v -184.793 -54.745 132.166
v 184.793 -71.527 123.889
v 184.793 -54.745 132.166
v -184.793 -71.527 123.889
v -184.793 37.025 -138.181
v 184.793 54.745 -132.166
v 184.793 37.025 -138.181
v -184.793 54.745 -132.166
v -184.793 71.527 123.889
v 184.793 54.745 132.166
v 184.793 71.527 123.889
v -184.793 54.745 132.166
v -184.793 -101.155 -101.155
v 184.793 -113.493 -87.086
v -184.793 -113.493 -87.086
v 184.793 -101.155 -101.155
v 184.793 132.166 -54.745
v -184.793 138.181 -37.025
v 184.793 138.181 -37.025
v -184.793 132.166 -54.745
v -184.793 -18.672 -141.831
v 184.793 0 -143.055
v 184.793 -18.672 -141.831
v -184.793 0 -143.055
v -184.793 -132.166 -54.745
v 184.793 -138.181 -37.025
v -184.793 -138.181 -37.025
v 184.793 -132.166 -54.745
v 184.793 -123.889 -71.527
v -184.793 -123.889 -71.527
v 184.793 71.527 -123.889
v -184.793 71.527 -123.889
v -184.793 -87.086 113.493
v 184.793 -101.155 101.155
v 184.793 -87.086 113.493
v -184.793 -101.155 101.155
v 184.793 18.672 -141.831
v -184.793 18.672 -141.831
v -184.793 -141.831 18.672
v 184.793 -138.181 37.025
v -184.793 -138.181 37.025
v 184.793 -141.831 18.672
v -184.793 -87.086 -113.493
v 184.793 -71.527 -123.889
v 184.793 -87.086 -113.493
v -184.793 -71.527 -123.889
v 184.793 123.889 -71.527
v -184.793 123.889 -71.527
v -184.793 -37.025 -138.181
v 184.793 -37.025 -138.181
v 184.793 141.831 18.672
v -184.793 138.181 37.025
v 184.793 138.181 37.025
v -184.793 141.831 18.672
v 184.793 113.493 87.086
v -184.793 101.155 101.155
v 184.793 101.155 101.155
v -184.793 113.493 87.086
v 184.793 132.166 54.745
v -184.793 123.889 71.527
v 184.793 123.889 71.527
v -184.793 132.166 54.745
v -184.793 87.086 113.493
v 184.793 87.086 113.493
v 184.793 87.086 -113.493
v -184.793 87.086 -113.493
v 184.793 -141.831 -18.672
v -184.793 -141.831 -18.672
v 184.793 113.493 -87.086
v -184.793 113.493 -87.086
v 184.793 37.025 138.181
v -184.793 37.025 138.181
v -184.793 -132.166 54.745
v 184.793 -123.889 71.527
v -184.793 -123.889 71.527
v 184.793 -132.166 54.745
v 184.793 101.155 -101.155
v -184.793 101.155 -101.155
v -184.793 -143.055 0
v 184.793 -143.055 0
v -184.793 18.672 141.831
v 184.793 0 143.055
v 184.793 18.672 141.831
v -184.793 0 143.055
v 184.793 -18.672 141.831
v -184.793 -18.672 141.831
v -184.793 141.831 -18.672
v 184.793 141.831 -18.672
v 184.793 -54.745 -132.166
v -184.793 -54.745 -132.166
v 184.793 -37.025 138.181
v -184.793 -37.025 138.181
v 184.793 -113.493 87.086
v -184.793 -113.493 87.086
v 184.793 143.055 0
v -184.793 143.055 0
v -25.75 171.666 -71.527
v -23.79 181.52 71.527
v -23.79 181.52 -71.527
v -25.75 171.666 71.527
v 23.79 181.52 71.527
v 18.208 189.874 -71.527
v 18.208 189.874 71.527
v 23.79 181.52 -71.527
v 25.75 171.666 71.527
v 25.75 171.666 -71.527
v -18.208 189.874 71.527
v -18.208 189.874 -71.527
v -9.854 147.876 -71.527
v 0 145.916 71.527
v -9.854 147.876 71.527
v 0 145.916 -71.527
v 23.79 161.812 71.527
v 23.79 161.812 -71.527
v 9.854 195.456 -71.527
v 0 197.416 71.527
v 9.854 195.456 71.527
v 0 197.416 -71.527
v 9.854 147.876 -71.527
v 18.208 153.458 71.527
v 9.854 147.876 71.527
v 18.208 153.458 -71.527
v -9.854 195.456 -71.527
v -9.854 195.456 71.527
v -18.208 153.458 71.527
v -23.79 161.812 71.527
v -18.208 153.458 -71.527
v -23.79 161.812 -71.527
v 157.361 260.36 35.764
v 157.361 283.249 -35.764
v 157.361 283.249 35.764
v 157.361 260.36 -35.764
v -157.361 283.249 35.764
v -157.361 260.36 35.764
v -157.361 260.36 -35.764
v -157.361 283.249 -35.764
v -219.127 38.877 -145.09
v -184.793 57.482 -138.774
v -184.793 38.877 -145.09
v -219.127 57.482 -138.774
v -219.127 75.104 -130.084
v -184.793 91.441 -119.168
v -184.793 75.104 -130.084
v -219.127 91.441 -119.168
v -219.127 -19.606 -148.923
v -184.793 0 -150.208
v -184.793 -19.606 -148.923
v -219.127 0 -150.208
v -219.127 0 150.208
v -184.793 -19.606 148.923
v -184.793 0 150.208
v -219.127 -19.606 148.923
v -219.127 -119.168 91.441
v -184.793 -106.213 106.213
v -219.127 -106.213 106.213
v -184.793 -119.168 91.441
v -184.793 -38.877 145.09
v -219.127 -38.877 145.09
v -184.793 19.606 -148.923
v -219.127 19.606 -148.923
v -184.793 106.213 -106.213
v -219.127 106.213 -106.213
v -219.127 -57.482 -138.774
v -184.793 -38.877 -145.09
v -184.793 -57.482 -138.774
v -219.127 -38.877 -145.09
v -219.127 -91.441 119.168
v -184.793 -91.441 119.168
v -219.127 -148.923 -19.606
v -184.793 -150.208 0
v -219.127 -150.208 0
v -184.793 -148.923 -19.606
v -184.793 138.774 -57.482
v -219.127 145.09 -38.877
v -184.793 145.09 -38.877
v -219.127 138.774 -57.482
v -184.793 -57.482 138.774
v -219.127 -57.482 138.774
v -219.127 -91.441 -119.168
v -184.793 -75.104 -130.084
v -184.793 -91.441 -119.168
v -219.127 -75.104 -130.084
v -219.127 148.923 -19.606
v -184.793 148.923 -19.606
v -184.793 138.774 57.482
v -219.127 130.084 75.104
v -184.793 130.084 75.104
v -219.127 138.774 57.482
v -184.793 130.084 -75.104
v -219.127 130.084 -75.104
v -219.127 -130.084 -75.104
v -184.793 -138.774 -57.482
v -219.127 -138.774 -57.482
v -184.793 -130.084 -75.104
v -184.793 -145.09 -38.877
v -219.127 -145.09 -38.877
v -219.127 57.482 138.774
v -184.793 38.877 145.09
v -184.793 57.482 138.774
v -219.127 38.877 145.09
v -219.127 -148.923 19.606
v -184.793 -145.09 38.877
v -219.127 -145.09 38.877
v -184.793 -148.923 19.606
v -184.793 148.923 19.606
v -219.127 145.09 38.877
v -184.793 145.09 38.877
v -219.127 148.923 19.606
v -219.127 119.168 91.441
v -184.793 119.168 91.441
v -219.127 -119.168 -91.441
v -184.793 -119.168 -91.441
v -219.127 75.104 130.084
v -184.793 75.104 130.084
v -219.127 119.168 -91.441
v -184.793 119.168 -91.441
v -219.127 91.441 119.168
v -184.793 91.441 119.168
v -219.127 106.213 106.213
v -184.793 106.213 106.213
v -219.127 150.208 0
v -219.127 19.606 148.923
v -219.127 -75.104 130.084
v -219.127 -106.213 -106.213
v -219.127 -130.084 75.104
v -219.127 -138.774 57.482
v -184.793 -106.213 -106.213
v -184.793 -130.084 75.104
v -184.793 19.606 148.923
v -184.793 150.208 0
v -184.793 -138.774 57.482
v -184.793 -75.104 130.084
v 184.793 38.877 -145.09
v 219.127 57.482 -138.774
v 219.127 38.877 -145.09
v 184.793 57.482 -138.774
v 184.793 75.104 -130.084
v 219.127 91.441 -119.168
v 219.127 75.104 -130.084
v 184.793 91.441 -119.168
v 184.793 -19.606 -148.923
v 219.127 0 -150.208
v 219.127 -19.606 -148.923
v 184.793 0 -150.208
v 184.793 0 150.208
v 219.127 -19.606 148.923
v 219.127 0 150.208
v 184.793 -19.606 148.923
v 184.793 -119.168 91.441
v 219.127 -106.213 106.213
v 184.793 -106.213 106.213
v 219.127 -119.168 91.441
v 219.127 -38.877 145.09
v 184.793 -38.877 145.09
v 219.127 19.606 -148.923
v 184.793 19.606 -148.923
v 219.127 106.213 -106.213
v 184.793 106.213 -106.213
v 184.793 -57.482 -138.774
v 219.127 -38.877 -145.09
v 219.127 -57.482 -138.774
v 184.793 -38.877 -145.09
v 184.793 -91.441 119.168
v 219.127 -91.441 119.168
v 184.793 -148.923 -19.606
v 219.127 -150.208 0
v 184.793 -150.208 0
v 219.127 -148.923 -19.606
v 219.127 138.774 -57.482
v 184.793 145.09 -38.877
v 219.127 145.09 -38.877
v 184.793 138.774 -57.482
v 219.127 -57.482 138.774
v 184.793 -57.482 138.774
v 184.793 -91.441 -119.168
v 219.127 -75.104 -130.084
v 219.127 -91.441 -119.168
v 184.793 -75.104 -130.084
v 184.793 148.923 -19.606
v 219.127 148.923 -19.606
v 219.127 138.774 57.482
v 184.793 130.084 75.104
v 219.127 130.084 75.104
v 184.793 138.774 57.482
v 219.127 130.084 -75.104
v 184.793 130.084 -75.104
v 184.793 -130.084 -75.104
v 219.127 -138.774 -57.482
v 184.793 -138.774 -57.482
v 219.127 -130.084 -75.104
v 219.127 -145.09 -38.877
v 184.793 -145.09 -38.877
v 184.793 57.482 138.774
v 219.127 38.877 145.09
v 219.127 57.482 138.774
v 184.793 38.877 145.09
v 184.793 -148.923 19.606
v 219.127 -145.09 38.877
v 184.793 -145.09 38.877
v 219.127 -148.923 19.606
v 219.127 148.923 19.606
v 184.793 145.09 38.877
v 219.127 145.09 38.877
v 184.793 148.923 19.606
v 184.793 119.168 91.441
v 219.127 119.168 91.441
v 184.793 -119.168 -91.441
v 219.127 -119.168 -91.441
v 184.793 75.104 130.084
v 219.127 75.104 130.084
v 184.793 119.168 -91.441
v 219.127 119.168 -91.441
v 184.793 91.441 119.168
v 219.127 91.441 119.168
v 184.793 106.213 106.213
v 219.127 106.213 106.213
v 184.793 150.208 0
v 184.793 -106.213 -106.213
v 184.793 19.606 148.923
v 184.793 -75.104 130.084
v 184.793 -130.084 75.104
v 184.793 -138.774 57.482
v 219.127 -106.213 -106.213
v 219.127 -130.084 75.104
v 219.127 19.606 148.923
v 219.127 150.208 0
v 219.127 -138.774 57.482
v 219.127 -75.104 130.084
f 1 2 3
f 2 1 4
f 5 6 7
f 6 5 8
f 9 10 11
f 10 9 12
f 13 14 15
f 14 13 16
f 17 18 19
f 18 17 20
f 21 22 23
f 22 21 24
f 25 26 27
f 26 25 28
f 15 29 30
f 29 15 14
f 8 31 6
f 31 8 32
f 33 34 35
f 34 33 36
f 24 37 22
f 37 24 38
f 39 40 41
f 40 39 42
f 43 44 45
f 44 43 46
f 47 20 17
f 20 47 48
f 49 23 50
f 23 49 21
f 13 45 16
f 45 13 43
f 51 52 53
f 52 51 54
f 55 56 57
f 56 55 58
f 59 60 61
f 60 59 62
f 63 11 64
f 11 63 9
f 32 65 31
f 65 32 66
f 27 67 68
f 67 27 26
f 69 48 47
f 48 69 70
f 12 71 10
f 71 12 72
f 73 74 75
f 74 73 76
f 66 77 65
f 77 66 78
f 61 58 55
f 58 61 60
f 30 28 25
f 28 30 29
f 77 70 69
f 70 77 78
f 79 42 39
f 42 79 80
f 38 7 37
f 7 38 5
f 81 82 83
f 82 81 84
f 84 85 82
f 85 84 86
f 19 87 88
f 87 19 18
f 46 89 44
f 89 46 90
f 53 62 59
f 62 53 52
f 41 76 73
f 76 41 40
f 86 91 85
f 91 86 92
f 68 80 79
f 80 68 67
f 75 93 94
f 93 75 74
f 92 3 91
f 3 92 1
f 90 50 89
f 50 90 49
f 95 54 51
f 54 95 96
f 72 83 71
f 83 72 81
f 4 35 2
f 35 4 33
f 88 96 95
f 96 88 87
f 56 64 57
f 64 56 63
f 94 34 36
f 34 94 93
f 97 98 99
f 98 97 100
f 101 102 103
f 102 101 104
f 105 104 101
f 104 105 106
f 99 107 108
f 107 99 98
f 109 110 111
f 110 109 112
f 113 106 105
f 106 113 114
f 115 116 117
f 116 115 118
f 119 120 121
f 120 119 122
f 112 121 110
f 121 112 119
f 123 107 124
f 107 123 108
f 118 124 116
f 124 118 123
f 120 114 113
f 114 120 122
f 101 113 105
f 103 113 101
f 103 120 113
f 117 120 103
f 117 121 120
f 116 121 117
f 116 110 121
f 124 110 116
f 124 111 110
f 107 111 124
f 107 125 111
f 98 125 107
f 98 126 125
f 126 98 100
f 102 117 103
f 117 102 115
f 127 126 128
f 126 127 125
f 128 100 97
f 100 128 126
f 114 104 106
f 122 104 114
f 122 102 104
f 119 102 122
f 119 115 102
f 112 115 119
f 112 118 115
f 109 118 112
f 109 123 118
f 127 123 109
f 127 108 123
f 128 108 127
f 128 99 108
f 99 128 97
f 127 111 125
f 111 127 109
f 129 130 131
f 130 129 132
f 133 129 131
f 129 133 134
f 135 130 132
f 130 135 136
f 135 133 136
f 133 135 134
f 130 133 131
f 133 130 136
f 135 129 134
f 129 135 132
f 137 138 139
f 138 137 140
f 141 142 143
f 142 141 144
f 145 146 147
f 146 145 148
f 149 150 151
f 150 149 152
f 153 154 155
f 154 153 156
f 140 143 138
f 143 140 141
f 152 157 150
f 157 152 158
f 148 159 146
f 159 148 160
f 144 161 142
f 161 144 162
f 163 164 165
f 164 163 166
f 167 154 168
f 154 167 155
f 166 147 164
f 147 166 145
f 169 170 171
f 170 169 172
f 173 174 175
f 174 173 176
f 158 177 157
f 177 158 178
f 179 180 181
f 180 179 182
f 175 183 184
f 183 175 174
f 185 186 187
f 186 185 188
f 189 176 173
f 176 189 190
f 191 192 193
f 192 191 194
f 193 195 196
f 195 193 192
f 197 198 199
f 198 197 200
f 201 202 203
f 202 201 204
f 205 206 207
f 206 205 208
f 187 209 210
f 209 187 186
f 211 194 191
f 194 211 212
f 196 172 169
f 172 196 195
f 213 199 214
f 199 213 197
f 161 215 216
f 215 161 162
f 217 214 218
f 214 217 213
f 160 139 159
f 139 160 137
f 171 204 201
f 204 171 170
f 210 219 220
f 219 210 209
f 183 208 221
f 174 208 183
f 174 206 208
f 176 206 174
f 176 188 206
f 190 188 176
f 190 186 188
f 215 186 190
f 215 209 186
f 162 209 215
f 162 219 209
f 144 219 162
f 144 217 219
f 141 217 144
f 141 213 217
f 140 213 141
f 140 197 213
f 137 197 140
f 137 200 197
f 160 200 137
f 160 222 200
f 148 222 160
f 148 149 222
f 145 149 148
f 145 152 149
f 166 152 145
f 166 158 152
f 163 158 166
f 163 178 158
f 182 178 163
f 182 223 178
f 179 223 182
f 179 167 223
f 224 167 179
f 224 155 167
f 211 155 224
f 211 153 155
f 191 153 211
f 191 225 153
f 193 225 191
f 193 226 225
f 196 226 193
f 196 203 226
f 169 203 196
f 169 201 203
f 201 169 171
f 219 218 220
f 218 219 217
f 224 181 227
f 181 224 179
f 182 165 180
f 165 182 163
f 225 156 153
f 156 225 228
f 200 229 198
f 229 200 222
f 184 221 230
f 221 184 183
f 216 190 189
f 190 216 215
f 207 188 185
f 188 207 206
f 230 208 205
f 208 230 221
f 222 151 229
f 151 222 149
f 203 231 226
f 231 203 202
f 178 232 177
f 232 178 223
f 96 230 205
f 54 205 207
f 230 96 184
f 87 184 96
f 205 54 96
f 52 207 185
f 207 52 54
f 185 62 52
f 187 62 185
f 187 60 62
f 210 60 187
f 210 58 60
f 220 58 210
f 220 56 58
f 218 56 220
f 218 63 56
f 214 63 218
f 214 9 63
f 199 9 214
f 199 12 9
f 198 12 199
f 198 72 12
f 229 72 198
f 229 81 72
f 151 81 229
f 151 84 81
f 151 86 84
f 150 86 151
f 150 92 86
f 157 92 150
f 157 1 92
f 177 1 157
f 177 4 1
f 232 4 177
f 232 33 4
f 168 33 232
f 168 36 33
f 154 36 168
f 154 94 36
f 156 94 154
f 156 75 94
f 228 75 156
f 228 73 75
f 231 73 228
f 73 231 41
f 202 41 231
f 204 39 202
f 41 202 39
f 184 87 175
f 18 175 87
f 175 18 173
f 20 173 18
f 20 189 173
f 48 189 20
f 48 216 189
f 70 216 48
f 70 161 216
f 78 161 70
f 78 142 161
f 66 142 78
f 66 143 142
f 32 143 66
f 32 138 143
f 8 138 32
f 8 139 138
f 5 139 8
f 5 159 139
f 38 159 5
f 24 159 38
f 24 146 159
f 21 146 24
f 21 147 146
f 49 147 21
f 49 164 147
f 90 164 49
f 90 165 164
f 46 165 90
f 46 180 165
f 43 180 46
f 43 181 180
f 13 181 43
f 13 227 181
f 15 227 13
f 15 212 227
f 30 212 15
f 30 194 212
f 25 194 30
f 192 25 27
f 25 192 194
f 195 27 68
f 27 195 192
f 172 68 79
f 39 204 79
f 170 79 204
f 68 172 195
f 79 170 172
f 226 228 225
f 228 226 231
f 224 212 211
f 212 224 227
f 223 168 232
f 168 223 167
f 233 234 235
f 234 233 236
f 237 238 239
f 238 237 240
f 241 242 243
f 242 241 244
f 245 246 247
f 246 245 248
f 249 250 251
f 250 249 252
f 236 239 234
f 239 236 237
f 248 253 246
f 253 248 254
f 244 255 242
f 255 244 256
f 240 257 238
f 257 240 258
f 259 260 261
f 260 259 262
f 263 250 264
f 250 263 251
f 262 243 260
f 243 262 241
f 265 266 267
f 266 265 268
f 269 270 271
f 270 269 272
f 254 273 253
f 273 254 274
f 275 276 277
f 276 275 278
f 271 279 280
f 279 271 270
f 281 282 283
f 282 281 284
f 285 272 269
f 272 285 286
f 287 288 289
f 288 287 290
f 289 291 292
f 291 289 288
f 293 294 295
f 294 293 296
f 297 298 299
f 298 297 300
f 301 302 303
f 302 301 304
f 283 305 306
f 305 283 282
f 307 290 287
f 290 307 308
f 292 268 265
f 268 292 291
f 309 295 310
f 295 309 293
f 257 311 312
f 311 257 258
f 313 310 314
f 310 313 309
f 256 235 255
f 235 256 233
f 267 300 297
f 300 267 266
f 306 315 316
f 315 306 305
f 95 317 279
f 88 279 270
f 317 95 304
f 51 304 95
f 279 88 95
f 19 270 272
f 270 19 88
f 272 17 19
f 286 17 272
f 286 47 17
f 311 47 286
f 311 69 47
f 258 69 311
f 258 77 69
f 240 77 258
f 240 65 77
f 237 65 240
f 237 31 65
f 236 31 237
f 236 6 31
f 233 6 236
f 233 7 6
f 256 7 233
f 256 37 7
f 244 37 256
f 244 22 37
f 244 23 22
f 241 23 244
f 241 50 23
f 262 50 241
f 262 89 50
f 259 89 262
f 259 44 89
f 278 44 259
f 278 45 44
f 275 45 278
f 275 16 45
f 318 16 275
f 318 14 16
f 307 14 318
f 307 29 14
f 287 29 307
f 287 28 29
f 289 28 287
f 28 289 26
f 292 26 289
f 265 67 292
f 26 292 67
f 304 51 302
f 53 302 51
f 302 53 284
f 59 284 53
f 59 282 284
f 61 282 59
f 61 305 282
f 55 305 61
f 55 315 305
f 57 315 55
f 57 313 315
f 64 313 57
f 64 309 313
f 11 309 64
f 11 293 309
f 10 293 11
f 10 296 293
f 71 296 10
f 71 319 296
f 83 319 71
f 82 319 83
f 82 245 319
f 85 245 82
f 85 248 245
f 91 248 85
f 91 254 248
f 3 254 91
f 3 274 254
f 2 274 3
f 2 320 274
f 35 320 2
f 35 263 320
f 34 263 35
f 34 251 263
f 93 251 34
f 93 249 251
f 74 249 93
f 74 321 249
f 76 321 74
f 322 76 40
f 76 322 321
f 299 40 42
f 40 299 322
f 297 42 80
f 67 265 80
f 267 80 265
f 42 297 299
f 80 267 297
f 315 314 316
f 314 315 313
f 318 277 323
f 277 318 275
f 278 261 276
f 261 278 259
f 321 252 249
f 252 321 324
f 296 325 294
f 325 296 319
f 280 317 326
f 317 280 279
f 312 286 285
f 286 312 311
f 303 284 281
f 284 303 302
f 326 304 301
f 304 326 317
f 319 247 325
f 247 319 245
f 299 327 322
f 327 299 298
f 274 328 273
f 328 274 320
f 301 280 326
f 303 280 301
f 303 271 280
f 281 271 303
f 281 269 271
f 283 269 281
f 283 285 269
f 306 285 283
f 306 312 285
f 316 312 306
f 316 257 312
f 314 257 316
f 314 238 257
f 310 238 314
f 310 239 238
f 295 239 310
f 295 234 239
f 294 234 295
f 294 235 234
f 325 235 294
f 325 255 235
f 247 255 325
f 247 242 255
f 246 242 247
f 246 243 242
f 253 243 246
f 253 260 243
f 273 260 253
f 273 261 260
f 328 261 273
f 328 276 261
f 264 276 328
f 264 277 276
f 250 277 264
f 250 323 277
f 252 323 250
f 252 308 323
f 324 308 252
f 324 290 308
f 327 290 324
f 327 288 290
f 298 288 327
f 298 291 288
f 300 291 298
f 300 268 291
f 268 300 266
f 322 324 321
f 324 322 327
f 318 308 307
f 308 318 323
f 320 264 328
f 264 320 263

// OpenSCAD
// Auto-generated by scripts/author_from_manifest.py (Phase D.3).
// Source: data/phase_d_manifest.json (sku_intent='nibco-lc-2000-butterfly-6in').
// Do not hand-edit — regenerate from the manifest.
//
// @part nibco_lc_2000_butterfly_6in
// @kind valve
// @category valve.butterfly
// @display-name "Nibco LC-2000 Grooved Butterfly Valve 6\" w/ Tamper Switch"
// @mfg nibco
// @mfg-pn LC-2000
// @listing UL FM
// @price-usd 330.00
// @install-minutes 30
// @crew foreman
// @param size_in number default=6 label="Size" unit="in"
// @port inlet position=[-0.05,0,0] direction=[-1,0,0] style=grooved size_in=6 role=run_a
// @port outlet position=[0.05,0,0] direction=[1,0,0] style=grooved size_in=6 role=run_b

size_in = 6.0;

function od_mm(nps) =
    nps ==   1  ? 33.4 :
    nps == 1.25 ? 42.2 :
    nps == 1.5  ? 48.3 :
    nps ==   2  ? 60.3 :
    nps == 2.5  ? 73.0 :
    nps ==   3  ? 88.9 :
    nps ==   4  ? 114.3 :
    nps ==   6  ? 168.3 :
    nps ==   8  ? 219.1 : 73.0;

od = od_mm(size_in);
body_len = od * 2.4;
body_d   = od * 1.7;

union() {
    // Valve body
    rotate([0, 90, 0])
        cylinder(h = body_len, d = body_d, center = true, $fn = 48);
    // Stem / handle indicator
    translate([0, body_d * 0.6, 0])
        cylinder(h = body_d * 0.5, d = body_d * 0.18, center = true, $fn = 16);
    translate([0, body_d * 0.95, 0])
        cube([body_d * 1.1, body_d * 0.08, body_d * 0.25], center = true);
    // End flanges
    translate([-body_len/2, 0, 0])
        rotate([0, 90, 0])
        cylinder(h = body_d * 0.12, d = body_d * 1.05, center = true, $fn = 48);
    translate([ body_len/2, 0, 0])
        rotate([0, 90, 0])
        cylinder(h = body_d * 0.12, d = body_d * 1.05, center = true, $fn = 48);
}
